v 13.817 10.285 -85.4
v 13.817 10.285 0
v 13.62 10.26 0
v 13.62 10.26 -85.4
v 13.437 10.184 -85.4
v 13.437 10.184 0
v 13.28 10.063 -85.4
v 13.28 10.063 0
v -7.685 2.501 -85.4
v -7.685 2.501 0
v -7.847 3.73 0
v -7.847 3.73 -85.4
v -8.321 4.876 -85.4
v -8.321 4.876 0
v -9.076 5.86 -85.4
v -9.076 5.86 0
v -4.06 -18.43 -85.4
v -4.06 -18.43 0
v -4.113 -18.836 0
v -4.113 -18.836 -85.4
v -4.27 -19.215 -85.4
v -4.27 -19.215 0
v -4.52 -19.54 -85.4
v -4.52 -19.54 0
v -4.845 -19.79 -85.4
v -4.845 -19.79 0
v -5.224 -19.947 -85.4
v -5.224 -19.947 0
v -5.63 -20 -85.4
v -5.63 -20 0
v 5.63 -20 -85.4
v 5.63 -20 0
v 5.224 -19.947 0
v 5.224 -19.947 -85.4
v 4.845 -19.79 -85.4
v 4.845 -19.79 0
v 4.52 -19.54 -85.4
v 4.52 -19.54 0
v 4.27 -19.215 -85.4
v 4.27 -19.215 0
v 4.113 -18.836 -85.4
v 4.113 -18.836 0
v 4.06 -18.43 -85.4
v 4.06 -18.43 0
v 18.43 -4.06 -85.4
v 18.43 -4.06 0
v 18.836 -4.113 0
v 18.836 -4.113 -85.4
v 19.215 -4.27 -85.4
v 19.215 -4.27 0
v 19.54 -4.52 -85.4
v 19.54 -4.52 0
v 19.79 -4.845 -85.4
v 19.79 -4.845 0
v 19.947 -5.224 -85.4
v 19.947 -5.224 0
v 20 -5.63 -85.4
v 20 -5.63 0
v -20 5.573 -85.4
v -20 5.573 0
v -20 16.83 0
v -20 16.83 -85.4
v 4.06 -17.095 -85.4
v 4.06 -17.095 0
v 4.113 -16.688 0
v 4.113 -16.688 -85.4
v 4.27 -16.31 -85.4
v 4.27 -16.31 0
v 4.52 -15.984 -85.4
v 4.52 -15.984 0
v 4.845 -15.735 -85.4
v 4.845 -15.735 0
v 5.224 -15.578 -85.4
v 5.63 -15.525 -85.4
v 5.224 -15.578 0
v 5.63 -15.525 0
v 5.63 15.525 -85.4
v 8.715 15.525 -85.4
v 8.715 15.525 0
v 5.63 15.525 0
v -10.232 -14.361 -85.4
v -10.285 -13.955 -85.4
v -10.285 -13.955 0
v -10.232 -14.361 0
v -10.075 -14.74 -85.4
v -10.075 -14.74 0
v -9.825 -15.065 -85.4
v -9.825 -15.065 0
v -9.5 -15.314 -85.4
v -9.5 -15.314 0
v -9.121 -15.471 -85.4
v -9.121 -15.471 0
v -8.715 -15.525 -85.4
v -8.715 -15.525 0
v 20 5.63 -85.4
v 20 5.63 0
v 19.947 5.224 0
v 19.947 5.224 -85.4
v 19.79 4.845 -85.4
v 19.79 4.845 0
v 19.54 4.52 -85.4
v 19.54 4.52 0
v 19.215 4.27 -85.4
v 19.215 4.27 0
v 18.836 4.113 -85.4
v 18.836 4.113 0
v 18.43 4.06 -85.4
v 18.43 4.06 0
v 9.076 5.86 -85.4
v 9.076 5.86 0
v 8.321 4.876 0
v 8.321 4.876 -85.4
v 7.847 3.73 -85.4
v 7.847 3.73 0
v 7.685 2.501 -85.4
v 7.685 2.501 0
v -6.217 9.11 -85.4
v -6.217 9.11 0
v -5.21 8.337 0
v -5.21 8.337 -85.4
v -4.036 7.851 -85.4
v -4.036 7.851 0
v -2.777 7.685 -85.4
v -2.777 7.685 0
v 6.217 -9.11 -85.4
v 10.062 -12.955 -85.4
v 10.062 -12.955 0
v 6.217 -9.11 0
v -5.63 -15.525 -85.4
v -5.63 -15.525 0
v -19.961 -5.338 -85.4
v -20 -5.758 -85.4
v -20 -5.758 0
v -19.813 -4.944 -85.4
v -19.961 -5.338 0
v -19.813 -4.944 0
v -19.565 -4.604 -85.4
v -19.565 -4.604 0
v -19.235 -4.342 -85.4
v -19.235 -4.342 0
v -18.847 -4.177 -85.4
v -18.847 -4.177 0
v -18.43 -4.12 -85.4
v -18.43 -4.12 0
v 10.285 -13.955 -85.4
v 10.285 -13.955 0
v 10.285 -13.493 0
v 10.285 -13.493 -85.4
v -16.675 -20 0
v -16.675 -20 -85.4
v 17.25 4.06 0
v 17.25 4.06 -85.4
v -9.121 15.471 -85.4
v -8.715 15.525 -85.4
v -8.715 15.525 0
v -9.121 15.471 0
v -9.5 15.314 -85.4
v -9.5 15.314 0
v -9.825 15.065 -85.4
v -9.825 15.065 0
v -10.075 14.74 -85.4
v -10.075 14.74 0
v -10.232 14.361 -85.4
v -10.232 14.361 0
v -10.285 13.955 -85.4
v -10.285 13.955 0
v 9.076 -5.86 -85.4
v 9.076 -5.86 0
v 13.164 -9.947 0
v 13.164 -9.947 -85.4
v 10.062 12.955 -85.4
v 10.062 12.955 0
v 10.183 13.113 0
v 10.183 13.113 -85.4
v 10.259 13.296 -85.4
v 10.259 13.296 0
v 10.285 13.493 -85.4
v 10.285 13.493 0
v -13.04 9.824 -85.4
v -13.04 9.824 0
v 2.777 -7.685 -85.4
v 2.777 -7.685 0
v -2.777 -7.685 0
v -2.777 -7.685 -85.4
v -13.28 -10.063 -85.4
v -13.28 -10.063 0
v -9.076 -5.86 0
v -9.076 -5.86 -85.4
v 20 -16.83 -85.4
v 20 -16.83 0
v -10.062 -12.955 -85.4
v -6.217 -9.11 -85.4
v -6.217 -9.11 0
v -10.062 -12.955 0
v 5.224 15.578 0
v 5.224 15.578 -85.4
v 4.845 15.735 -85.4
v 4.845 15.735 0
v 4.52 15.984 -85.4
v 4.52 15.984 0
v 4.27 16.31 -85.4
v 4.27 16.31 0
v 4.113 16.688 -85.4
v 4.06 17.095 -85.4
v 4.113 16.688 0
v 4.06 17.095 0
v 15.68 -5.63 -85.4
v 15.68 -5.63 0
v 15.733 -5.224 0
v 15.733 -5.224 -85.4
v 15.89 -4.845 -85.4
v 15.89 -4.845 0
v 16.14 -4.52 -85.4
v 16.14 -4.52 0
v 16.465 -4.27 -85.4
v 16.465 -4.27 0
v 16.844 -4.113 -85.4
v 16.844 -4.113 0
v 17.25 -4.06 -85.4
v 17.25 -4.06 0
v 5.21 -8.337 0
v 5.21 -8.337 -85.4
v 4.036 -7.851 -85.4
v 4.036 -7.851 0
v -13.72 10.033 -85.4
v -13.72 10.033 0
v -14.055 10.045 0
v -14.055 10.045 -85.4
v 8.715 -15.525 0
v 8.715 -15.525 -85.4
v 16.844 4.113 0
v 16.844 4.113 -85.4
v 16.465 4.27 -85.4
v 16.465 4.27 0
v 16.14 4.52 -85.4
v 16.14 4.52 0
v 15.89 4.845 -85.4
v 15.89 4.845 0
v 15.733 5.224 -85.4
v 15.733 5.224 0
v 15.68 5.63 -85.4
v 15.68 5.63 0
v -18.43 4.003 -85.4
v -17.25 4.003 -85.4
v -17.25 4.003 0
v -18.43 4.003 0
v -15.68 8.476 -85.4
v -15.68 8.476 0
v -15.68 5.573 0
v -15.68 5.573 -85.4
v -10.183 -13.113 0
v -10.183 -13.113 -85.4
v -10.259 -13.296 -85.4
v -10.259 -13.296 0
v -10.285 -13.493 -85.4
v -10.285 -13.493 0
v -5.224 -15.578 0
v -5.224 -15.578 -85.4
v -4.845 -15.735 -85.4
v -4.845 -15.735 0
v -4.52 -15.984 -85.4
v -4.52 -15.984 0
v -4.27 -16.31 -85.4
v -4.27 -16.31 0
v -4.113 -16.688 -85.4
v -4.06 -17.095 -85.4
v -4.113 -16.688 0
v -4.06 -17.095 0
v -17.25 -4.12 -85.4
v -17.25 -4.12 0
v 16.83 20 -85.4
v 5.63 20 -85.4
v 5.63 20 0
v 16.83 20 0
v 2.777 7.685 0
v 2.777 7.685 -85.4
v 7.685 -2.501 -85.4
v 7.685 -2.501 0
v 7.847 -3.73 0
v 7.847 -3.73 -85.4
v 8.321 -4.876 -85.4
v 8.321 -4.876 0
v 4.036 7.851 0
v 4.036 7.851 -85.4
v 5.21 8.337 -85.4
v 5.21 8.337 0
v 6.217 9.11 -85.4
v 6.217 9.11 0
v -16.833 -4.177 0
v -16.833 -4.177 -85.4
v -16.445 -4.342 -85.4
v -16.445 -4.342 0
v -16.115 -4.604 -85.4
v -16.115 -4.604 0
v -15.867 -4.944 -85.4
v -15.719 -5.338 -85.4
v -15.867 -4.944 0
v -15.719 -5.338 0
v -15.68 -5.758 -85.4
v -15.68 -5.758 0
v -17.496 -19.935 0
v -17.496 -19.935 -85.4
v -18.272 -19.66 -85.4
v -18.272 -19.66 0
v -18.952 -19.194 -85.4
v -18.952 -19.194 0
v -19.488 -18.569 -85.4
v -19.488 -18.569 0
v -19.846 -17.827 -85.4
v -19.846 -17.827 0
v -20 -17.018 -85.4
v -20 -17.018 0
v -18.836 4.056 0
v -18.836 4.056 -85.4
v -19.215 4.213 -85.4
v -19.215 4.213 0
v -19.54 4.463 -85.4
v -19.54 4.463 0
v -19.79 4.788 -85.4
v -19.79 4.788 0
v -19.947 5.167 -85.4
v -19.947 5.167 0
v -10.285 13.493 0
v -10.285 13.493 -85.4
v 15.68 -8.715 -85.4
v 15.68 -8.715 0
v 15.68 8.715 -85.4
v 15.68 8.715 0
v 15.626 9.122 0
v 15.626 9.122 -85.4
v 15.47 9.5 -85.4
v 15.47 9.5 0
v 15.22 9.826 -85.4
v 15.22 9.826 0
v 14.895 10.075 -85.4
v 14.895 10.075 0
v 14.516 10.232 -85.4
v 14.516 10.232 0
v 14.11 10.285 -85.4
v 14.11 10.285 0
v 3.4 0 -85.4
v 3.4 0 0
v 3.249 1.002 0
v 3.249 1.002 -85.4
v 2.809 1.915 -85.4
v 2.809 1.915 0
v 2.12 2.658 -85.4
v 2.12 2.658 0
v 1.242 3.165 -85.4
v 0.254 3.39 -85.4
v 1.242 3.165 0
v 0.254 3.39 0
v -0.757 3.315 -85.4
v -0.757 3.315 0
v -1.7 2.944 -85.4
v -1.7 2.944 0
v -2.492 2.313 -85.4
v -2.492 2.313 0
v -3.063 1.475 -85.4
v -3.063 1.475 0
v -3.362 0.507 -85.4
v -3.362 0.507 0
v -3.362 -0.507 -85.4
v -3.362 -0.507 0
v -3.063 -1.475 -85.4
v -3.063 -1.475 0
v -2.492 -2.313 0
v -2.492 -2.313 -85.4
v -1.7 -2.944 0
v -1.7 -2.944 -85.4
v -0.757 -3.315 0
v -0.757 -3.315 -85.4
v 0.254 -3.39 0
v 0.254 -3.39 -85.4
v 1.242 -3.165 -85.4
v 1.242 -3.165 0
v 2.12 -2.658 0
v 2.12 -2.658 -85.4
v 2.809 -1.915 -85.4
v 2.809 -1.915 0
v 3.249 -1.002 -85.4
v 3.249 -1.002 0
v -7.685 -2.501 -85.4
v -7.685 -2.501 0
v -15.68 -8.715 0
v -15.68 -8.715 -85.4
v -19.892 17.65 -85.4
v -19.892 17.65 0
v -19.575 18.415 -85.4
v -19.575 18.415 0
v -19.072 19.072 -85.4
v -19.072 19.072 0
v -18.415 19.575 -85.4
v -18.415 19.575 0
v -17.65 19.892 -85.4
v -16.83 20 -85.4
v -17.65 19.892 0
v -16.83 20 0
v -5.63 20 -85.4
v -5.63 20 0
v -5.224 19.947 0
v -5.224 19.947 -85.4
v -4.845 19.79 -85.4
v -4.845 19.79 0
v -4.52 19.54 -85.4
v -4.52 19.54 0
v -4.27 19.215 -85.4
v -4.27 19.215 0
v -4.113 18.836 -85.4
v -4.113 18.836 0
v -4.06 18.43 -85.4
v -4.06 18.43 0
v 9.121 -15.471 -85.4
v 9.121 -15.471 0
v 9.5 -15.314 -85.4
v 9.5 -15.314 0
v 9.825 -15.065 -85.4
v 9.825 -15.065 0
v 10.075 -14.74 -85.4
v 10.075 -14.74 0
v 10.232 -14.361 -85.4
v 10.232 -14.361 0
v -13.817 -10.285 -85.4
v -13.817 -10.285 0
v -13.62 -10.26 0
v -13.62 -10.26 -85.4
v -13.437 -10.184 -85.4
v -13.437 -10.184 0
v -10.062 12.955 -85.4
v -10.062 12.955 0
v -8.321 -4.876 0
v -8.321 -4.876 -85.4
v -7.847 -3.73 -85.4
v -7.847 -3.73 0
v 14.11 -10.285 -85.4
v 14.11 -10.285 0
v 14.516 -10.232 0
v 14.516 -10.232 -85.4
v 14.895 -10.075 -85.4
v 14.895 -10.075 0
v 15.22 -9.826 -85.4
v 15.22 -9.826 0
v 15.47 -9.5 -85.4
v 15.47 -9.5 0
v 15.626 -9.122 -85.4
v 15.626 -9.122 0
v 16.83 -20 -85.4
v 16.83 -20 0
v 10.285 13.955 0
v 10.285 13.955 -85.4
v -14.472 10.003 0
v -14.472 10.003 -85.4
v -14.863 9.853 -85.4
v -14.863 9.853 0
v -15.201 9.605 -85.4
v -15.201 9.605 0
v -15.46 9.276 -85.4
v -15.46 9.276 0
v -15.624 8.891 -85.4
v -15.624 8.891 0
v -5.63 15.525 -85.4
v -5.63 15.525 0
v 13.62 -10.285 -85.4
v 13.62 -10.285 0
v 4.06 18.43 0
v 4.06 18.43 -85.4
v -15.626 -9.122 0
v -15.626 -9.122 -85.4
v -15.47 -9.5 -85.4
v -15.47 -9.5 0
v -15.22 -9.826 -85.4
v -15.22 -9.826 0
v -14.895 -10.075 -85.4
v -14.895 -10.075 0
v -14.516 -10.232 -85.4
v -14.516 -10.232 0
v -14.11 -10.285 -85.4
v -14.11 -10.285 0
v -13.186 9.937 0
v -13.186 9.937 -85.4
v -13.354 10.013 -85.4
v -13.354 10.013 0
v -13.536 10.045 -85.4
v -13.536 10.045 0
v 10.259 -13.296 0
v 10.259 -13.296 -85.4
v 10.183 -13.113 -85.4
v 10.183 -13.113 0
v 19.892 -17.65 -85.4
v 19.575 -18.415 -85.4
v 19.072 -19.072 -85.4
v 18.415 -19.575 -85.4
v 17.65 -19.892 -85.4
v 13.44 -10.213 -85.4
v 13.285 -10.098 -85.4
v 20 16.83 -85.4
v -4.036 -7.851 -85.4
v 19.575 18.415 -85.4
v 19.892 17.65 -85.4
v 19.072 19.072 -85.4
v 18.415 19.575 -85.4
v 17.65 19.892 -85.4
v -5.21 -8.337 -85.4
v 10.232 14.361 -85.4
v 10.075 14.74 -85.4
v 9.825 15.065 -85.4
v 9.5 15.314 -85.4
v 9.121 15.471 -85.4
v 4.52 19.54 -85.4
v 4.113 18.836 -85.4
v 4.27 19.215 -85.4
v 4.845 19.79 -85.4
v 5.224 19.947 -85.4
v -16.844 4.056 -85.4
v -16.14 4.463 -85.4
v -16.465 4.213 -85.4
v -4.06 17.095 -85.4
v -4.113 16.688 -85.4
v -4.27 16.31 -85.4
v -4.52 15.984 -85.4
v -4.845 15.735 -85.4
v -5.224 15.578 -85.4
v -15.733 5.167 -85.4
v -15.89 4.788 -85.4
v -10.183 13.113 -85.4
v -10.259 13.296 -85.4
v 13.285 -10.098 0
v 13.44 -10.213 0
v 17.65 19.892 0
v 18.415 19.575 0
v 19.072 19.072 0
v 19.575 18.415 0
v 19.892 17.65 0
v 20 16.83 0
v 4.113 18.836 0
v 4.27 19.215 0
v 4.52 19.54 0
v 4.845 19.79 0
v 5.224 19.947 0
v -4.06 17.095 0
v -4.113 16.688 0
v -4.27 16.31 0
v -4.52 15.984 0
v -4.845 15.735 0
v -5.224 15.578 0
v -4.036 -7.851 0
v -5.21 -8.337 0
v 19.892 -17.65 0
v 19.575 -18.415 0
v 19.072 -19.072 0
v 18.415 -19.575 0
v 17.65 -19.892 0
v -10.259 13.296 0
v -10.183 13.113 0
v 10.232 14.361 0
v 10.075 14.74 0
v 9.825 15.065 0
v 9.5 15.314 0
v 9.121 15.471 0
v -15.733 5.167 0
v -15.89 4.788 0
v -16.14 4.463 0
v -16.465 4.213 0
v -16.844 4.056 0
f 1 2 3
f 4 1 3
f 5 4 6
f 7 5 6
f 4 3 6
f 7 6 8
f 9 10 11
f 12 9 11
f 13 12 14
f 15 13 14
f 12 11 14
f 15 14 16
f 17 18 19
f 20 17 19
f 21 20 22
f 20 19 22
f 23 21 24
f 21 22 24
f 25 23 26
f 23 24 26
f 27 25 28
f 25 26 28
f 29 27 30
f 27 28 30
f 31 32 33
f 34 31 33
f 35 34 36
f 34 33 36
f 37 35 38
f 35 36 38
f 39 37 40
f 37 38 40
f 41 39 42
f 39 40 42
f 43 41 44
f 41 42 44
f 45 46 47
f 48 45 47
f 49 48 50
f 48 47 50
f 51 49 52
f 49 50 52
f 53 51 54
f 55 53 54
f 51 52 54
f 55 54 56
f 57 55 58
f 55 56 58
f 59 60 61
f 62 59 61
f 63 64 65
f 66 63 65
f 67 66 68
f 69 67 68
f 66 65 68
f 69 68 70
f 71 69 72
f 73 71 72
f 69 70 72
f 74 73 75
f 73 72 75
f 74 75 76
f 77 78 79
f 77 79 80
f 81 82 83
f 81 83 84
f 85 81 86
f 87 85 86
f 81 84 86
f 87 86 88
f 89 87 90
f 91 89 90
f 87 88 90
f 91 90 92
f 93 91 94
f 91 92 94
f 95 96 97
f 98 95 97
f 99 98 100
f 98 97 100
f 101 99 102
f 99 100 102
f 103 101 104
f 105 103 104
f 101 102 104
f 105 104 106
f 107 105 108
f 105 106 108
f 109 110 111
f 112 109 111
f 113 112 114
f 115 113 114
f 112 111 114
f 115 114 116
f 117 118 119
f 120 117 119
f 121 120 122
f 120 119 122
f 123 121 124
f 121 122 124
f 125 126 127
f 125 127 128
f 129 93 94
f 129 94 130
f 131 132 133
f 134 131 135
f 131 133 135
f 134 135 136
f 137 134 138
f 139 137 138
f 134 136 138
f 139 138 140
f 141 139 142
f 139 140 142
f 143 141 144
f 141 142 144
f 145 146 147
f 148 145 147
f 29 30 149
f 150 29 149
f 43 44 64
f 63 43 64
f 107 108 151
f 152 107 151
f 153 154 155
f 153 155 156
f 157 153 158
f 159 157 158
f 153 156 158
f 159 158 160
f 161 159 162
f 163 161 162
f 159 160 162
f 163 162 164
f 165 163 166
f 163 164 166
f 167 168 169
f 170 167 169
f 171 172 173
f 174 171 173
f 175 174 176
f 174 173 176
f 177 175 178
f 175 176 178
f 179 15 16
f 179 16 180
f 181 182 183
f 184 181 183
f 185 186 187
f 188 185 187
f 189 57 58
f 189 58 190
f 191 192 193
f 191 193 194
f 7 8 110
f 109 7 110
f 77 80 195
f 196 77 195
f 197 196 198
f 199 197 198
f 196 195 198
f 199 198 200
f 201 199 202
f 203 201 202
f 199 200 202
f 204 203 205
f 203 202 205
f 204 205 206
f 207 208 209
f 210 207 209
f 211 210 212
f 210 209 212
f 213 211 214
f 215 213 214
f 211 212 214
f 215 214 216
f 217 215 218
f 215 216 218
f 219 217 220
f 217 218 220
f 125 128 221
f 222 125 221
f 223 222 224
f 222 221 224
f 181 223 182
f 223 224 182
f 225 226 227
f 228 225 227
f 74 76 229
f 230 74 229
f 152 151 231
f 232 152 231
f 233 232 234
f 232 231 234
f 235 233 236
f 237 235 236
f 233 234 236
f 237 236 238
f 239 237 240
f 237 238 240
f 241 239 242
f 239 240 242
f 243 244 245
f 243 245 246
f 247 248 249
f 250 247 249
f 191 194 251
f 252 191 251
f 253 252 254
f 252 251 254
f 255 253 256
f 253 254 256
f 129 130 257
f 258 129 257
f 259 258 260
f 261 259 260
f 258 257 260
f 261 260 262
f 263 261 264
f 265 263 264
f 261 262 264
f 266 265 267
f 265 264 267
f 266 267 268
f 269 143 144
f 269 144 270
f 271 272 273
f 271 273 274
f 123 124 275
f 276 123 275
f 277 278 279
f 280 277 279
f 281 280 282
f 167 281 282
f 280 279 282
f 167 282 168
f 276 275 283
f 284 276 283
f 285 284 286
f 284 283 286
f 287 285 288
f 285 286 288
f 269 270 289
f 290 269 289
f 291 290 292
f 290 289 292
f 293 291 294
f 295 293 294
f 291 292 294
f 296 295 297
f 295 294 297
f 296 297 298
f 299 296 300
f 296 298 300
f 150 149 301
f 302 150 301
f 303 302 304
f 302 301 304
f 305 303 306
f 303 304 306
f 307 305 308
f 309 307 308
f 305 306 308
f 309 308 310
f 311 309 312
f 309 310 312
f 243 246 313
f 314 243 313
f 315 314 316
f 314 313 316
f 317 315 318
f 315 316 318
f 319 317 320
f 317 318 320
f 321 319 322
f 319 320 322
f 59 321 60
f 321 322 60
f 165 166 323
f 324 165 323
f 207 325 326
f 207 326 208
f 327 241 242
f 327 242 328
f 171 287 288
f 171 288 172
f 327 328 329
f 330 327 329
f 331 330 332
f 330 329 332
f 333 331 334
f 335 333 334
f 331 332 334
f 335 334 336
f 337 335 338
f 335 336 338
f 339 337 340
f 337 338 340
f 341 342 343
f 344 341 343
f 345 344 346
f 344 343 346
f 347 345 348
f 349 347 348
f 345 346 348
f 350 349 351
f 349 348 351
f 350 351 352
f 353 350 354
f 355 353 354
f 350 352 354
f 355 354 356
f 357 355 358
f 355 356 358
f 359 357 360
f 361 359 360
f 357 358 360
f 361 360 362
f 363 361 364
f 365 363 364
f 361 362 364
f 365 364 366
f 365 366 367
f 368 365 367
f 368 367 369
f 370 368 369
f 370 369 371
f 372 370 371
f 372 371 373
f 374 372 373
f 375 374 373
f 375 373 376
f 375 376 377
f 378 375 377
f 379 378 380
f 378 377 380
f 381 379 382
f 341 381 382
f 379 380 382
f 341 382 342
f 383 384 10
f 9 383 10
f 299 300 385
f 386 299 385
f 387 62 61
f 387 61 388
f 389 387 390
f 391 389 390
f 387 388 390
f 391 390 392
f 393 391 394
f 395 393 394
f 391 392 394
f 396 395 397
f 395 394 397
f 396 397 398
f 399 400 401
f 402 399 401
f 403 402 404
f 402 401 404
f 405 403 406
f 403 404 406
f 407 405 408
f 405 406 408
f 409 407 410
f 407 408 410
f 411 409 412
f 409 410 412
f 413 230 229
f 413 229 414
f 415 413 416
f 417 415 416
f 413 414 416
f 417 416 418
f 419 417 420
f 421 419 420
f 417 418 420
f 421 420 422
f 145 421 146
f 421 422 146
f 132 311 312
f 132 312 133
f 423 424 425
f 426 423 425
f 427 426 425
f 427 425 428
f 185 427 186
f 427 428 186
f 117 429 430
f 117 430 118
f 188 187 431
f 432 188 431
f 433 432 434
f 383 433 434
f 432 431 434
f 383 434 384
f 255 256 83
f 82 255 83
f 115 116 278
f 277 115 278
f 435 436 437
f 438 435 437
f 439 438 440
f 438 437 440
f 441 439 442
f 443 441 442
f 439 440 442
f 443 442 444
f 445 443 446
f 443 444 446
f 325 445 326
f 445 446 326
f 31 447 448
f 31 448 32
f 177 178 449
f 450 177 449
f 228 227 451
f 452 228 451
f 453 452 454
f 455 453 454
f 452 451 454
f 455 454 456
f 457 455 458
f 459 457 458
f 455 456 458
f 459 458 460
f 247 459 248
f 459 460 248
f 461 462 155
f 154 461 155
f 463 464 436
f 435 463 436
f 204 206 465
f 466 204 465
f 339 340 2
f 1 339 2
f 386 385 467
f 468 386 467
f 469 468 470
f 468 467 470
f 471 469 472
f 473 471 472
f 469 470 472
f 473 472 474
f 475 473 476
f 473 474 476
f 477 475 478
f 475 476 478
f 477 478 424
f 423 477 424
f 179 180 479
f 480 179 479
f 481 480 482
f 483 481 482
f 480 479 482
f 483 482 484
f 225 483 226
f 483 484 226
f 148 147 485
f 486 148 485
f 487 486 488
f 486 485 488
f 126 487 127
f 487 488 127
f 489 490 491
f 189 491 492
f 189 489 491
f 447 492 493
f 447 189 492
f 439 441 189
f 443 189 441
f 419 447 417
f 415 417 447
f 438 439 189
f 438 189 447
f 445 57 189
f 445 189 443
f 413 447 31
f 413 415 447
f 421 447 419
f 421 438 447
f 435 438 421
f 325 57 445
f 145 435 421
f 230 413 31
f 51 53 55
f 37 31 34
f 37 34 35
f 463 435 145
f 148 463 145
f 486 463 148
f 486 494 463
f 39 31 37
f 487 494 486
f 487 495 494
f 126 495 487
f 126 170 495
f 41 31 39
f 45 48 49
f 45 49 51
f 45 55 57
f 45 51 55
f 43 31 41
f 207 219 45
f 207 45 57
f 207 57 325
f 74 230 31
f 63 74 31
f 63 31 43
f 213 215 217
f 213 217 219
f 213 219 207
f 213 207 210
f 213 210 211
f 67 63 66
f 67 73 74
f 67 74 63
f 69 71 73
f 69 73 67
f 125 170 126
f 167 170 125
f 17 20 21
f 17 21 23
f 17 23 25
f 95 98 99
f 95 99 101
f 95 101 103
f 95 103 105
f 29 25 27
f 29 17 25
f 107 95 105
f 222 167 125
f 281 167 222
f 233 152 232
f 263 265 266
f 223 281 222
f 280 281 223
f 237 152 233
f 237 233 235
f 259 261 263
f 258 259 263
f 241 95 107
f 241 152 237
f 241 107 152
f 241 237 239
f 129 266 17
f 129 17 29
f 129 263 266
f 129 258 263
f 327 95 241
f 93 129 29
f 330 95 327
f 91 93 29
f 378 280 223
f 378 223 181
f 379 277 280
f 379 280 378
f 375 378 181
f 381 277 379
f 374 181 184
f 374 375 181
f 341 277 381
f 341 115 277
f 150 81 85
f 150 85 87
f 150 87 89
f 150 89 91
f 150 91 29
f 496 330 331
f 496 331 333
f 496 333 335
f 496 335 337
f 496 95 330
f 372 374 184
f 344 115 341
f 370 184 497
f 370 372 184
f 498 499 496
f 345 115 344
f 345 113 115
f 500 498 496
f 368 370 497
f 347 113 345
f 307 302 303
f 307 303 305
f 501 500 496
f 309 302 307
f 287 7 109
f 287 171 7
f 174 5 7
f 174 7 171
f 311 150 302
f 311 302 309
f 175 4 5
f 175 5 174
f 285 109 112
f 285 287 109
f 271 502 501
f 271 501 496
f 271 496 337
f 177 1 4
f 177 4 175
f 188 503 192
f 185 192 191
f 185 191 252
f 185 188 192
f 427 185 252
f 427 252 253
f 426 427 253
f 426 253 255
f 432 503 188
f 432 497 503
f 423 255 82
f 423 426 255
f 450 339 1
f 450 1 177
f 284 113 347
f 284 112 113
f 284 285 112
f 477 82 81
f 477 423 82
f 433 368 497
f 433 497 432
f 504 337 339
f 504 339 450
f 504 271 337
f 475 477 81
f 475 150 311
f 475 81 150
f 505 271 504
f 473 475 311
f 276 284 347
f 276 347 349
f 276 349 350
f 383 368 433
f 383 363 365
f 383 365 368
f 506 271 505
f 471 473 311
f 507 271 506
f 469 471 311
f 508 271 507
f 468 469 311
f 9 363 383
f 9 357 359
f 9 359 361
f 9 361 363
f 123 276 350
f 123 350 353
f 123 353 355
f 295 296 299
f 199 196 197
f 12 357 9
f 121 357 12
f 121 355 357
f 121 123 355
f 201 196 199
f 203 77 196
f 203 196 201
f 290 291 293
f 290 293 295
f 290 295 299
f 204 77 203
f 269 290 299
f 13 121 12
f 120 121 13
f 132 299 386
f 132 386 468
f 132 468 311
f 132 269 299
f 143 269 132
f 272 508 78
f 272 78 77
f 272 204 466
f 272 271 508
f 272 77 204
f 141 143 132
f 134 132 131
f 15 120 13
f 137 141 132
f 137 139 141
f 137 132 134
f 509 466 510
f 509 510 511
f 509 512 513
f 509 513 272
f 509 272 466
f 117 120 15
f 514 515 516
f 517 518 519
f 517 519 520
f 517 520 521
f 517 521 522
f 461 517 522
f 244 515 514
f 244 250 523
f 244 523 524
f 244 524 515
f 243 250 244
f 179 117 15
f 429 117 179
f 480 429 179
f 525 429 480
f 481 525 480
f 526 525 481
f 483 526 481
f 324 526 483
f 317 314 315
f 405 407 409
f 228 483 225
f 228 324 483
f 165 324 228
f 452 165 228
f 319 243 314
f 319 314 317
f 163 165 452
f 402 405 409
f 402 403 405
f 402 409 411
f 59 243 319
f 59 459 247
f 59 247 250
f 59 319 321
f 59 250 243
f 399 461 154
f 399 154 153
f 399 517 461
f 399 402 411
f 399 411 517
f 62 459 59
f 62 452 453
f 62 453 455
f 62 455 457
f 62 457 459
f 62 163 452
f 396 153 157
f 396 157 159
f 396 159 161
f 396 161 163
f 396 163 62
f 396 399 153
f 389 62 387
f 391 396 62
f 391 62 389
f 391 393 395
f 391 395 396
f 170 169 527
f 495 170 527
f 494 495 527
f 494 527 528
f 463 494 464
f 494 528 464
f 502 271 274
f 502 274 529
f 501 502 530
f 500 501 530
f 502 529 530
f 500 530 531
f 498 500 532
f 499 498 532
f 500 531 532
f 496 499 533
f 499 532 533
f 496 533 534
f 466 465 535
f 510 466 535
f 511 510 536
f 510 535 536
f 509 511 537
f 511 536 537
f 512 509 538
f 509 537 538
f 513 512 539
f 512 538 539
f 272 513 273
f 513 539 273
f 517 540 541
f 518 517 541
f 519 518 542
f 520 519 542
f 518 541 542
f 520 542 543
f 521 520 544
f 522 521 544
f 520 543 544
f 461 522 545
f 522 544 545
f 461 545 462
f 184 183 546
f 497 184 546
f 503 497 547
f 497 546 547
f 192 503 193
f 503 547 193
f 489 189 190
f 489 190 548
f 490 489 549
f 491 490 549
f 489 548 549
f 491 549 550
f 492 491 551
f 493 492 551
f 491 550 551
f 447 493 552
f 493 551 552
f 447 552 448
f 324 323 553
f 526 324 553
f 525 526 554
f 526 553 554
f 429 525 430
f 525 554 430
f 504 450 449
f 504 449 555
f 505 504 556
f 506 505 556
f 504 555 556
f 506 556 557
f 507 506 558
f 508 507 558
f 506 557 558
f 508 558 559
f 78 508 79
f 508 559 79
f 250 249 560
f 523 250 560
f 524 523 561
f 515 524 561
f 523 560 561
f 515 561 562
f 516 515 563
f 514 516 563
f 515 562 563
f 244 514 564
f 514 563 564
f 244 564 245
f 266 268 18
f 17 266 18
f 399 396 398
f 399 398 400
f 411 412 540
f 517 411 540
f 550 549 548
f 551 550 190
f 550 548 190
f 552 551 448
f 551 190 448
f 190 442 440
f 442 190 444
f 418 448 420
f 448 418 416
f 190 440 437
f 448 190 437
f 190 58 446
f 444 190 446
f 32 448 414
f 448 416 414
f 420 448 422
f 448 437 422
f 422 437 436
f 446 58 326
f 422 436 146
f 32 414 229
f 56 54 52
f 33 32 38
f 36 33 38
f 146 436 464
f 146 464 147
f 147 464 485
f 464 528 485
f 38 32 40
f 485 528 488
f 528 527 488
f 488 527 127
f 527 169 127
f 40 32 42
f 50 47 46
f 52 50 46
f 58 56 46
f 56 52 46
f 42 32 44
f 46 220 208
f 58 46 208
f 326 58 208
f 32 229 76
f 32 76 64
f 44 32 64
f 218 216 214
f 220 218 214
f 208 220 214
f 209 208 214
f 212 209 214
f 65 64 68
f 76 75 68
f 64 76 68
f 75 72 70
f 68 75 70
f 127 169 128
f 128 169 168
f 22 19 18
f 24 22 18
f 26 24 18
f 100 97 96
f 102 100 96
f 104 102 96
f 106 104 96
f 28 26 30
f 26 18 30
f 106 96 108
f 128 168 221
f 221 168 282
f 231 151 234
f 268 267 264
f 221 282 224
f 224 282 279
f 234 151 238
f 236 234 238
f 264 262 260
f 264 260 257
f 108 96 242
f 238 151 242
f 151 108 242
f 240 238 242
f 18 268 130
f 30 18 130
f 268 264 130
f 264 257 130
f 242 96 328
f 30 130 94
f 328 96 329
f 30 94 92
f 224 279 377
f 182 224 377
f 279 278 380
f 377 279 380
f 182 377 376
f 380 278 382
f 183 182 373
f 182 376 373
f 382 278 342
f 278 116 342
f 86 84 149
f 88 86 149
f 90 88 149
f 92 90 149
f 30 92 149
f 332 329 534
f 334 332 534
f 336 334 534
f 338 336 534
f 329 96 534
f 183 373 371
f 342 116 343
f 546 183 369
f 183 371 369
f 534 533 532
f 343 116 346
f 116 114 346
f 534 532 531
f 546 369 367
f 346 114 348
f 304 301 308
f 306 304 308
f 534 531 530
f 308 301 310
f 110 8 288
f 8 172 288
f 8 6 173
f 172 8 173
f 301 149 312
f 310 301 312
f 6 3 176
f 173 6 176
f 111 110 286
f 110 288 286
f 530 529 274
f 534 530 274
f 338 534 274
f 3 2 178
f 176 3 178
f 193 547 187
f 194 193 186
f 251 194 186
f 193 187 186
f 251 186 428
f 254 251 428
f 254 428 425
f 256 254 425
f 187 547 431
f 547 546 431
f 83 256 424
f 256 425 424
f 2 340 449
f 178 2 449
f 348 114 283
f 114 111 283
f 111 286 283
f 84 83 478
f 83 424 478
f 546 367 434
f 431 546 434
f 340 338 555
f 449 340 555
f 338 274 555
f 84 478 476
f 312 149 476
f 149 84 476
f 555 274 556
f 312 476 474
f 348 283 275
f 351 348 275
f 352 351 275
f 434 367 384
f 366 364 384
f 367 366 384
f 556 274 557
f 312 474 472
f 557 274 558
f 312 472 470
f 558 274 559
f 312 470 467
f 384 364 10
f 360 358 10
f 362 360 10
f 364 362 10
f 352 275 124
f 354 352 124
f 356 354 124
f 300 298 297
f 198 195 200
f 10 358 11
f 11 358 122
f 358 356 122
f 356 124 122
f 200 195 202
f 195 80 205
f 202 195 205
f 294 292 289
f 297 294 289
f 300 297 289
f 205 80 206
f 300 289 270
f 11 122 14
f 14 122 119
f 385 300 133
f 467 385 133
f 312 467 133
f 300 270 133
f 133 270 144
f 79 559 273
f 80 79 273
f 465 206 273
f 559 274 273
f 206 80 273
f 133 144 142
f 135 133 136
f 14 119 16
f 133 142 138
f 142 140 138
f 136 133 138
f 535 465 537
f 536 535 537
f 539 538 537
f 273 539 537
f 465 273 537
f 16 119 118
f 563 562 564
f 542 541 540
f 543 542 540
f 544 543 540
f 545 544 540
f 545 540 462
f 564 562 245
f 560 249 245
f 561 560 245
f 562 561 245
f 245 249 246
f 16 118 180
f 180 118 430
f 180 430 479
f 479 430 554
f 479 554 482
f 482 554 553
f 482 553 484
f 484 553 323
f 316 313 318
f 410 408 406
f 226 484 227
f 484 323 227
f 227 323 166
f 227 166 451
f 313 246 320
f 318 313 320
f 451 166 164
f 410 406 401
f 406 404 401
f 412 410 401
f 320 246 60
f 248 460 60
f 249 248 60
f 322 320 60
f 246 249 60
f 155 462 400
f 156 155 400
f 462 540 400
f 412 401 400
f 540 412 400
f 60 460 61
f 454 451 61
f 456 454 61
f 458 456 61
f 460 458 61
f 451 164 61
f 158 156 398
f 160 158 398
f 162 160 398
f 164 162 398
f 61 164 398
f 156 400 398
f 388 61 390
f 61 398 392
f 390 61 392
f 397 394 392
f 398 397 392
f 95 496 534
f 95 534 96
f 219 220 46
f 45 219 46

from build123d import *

# Parameters (mm, degrees)
SKETCH1_R      = 3.4
EXTRUDE1_DEPTH = 85.4


with BuildPart() as part:
    # Sketch1 → Extrude1 (new body)
    with BuildSketch(Plane.XY):
        with BuildLine():
            Line((-8.715, -15.524615034), (-5.63, -15.524615034))
            ThreePointArc((-5.63, -15.524615034), (-4.519842354, -15.984457388), (-4.06, -17.094615034))
            Line((-4.06, -17.094615034), (-4.06, -18.43))
            ThreePointArc((-4.06, -18.43), (-4.519842354, -19.540157646), (-5.63, -20))
            Line((-5.63, -20), (-16.674615034, -20))
            ThreePointArc((-16.674615034, -20), (-18.951578385, -19.194274381), (-20, -17.018368134))
            Line((-20, -17.018368134), (-20, -5.757918808))
            ThreePointArc((-20, -5.757918808), (-19.564709668, -4.603883664), (-18.43, -4.120449326))
            Line((-18.43, -4.120449326), (-17.25, -4.120449326))
            ThreePointArc((-17.25, -4.120449326), (-16.115287682, -4.60388249), (-15.67999625, -5.757919334))
            Line((-15.67999625, -5.757919334), (-15.67999625, -8.715399492))
            ThreePointArc((-15.67999625, -8.715399492), (-15.220153896, -9.825557139), (-14.10999625, -10.285399492))
            Line((-14.10999625, -10.285399492), (-13.816898819, -10.285399492))
            ThreePointArc((-13.816898819, -10.285399492), (-13.526061711, -10.227547119), (-13.279501941, -10.062800646))
            Line((-13.279501941, -10.062800646), (-9.076242789, -5.859541495))
            ThreePointArc((-9.076242789, -5.859541495), (-8.046572221, -4.318530588), (-7.685, -2.500784284))
            Line((-7.685, -2.500784284), (-7.685, 2.500784284))
            ThreePointArc((-7.685, 2.500784284), (-8.046572221, 4.318530588), (-9.076242789, 5.859541495))
            Line((-9.076242789, 5.859541495), (-13.040489136, 9.823787841))
            ThreePointArc((-13.040489136, 9.823787841), (-13.354224618, 10.012729352), (-13.71989919, 10.033001362))
            Line((-13.71989919, 10.033001362), (-14.05520779, 10.044710596))
            ThreePointArc((-14.05520779, 10.044710596), (-15.200613642, 9.605030484), (-15.68, 8.475666998))
            Line((-15.68, 8.475666998), (-15.68, 5.572979049))
            ThreePointArc((-15.68, 5.572979049), (-16.139842354, 4.462821403), (-17.25, 4.002979049))
            Line((-17.25, 4.002979049), (-18.43, 4.002979049))
            ThreePointArc((-18.43, 4.002979049), (-19.540157646, 4.462821403), (-20, 5.572979049))
            Line((-20, 5.572979049), (-20, 13.004526564))
            Line((-20, 13.004526564), (-20, 16.83))
            ThreePointArc((-20, 16.83), (-19.071528496, 19.071528496), (-16.83, 20))
            Line((-16.83, 20), (-5.63, 20))
            ThreePointArc((-5.63, 20), (-4.519842354, 19.540157646), (-4.06, 18.43))
            Line((-4.06, 18.43), (-4.06, 17.094615034))
            ThreePointArc((-4.06, 17.094615034), (-4.519842354, 15.984457388), (-5.63, 15.524615034))
            Line((-5.63, 15.524615034), (-8.715, 15.524615034))
            ThreePointArc((-8.715, 15.524615034), (-9.825157646, 15.06477268), (-10.285, 13.954615034))
            Line((-10.285, 13.954615034), (-10.285, 13.492503602))
            ThreePointArc((-10.285, 13.492503602), (-10.227148445, 13.201664194), (-10.062401154, 12.955102448))
            Line((-10.062401154, 12.955102448), (-6.217092793, 9.109794088))
            ThreePointArc((-6.217092793, 9.109794088), (-4.63891877, 8.055291919), (-2.777335583, 7.685))
            Line((-2.777335583, 7.685), (2.777335583, 7.685))
            ThreePointArc((2.777335583, 7.685), (4.63891877, 8.055291919), (6.217092793, 9.109794088))
            Line((6.217092793, 9.109794088), (10.062401154, 12.955102448))
            ThreePointArc((10.062401154, 12.955102448), (10.227148445, 13.201664194), (10.285, 13.492503602))
            Line((10.285, 13.492503602), (10.285, 13.954615034))
            ThreePointArc((10.285, 13.954615034), (9.825157646, 15.06477268), (8.715, 15.524615034))
            Line((8.715, 15.524615034), (5.63, 15.524615034))
            ThreePointArc((5.63, 15.524615034), (4.519842354, 15.984457388), (4.06, 17.094615034))
            Line((4.06, 17.094615034), (4.06, 18.43))
            ThreePointArc((4.06, 18.43), (4.519842354, 19.540157646), (5.63, 20))
            Line((5.63, 20), (12.979635074, 20))
            Line((12.979635074, 20), (16.83, 20))
            ThreePointArc((16.83, 20), (19.071528496, 19.071528496), (20, 16.83))
            Line((20, 16.83), (20, 13.001098436))
            Line((20, 13.001098436), (20, 5.63))
            ThreePointArc((20, 5.63), (19.540157461, 4.519842693), (18.43, 4.060000526))
            Line((18.43, 4.060000526), (17.24999625, 4.060000526))
            ThreePointArc((17.24999625, 4.060000526), (16.139838603, 4.519842879), (15.67999625, 5.630000526))
            Line((15.67999625, 5.630000526), (15.67999625, 8.715399492))
            ThreePointArc((15.67999625, 8.715399492), (15.220153896, 9.825557139), (14.10999625, 10.285399492))
            Line((14.10999625, 10.285399492), (13.816903094, 10.285399492))
            ThreePointArc((13.816903094, 10.285399492), (13.526063686, 10.227547937), (13.279501941, 10.062800646))
            Line((13.279501941, 10.062800646), (9.076242789, 5.859541495))
            ThreePointArc((9.076242789, 5.859541495), (8.046572221, 4.318530588), (7.685, 2.500784284))
            Line((7.685, 2.500784284), (7.685, -2.500784284))
            ThreePointArc((7.685, -2.500784284), (8.046572221, -4.318530588), (9.076242789, -5.859541495))
            Line((9.076242789, -5.859541495), (13.163657296, -9.946956002))
            ThreePointArc((13.163657296, -9.946956002), (13.35903797, -10.160433474), (13.6200547, -10.285399492))
            Line((13.6200547, -10.285399492), (14.10999625, -10.285399492))
            ThreePointArc((14.10999625, -10.285399492), (15.220153896, -9.825557139), (15.67999625, -8.715399492))
            Line((15.67999625, -8.715399492), (15.67999625, -5.630000526))
            ThreePointArc((15.67999625, -5.630000526), (16.139838603, -4.519842879), (17.24999625, -4.060000526))
            Line((17.24999625, -4.060000526), (18.43, -4.060000526))
            ThreePointArc((18.43, -4.060000526), (19.540157461, -4.519842693), (20, -5.63))
            Line((20, -5.63), (20, -16.83))
            ThreePointArc((20, -16.83), (19.071528496, -19.071528496), (16.83, -20))
            Line((16.83, -20), (13, -20))
            Line((13, -20), (5.63, -20))
            ThreePointArc((5.63, -20), (4.519842354, -19.540157646), (4.06, -18.43))
            Line((4.06, -18.43), (4.06, -17.094615034))
            ThreePointArc((4.06, -17.094615034), (4.519842354, -15.984457388), (5.63, -15.524615034))
            Line((5.63, -15.524615034), (8.715, -15.524615034))
            ThreePointArc((8.715, -15.524615034), (9.825157646, -15.06477268), (10.285, -13.954615034))
            Line((10.285, -13.954615034), (10.285, -13.492503602))
            ThreePointArc((10.285, -13.492503602), (10.227148445, -13.201664194), (10.062401154, -12.955102448))
            Line((10.062401154, -12.955102448), (6.217092793, -9.109794088))
            ThreePointArc((6.217092793, -9.109794088), (4.63891877, -8.055291919), (2.777335583, -7.685))
            Line((2.777335583, -7.685), (-2.777335583, -7.685))
            ThreePointArc((-2.777335583, -7.685), (-4.63891877, -8.055291919), (-6.217092793, -9.109794088))
            Line((-6.217092793, -9.109794088), (-10.062401154, -12.955102448))
            ThreePointArc((-10.062401154, -12.955102448), (-10.227148445, -13.201664194), (-10.285, -13.492503602))
            Line((-10.285, -13.492503602), (-10.285, -13.954615034))
            ThreePointArc((-10.285, -13.954615034), (-9.825157646, -15.06477268), (-8.715, -15.524615034))
        make_face()
        Circle(SKETCH1_R, mode=Mode.SUBTRACT)
    extrude(amount=-EXTRUDE1_DEPTH)


solid = part.part
